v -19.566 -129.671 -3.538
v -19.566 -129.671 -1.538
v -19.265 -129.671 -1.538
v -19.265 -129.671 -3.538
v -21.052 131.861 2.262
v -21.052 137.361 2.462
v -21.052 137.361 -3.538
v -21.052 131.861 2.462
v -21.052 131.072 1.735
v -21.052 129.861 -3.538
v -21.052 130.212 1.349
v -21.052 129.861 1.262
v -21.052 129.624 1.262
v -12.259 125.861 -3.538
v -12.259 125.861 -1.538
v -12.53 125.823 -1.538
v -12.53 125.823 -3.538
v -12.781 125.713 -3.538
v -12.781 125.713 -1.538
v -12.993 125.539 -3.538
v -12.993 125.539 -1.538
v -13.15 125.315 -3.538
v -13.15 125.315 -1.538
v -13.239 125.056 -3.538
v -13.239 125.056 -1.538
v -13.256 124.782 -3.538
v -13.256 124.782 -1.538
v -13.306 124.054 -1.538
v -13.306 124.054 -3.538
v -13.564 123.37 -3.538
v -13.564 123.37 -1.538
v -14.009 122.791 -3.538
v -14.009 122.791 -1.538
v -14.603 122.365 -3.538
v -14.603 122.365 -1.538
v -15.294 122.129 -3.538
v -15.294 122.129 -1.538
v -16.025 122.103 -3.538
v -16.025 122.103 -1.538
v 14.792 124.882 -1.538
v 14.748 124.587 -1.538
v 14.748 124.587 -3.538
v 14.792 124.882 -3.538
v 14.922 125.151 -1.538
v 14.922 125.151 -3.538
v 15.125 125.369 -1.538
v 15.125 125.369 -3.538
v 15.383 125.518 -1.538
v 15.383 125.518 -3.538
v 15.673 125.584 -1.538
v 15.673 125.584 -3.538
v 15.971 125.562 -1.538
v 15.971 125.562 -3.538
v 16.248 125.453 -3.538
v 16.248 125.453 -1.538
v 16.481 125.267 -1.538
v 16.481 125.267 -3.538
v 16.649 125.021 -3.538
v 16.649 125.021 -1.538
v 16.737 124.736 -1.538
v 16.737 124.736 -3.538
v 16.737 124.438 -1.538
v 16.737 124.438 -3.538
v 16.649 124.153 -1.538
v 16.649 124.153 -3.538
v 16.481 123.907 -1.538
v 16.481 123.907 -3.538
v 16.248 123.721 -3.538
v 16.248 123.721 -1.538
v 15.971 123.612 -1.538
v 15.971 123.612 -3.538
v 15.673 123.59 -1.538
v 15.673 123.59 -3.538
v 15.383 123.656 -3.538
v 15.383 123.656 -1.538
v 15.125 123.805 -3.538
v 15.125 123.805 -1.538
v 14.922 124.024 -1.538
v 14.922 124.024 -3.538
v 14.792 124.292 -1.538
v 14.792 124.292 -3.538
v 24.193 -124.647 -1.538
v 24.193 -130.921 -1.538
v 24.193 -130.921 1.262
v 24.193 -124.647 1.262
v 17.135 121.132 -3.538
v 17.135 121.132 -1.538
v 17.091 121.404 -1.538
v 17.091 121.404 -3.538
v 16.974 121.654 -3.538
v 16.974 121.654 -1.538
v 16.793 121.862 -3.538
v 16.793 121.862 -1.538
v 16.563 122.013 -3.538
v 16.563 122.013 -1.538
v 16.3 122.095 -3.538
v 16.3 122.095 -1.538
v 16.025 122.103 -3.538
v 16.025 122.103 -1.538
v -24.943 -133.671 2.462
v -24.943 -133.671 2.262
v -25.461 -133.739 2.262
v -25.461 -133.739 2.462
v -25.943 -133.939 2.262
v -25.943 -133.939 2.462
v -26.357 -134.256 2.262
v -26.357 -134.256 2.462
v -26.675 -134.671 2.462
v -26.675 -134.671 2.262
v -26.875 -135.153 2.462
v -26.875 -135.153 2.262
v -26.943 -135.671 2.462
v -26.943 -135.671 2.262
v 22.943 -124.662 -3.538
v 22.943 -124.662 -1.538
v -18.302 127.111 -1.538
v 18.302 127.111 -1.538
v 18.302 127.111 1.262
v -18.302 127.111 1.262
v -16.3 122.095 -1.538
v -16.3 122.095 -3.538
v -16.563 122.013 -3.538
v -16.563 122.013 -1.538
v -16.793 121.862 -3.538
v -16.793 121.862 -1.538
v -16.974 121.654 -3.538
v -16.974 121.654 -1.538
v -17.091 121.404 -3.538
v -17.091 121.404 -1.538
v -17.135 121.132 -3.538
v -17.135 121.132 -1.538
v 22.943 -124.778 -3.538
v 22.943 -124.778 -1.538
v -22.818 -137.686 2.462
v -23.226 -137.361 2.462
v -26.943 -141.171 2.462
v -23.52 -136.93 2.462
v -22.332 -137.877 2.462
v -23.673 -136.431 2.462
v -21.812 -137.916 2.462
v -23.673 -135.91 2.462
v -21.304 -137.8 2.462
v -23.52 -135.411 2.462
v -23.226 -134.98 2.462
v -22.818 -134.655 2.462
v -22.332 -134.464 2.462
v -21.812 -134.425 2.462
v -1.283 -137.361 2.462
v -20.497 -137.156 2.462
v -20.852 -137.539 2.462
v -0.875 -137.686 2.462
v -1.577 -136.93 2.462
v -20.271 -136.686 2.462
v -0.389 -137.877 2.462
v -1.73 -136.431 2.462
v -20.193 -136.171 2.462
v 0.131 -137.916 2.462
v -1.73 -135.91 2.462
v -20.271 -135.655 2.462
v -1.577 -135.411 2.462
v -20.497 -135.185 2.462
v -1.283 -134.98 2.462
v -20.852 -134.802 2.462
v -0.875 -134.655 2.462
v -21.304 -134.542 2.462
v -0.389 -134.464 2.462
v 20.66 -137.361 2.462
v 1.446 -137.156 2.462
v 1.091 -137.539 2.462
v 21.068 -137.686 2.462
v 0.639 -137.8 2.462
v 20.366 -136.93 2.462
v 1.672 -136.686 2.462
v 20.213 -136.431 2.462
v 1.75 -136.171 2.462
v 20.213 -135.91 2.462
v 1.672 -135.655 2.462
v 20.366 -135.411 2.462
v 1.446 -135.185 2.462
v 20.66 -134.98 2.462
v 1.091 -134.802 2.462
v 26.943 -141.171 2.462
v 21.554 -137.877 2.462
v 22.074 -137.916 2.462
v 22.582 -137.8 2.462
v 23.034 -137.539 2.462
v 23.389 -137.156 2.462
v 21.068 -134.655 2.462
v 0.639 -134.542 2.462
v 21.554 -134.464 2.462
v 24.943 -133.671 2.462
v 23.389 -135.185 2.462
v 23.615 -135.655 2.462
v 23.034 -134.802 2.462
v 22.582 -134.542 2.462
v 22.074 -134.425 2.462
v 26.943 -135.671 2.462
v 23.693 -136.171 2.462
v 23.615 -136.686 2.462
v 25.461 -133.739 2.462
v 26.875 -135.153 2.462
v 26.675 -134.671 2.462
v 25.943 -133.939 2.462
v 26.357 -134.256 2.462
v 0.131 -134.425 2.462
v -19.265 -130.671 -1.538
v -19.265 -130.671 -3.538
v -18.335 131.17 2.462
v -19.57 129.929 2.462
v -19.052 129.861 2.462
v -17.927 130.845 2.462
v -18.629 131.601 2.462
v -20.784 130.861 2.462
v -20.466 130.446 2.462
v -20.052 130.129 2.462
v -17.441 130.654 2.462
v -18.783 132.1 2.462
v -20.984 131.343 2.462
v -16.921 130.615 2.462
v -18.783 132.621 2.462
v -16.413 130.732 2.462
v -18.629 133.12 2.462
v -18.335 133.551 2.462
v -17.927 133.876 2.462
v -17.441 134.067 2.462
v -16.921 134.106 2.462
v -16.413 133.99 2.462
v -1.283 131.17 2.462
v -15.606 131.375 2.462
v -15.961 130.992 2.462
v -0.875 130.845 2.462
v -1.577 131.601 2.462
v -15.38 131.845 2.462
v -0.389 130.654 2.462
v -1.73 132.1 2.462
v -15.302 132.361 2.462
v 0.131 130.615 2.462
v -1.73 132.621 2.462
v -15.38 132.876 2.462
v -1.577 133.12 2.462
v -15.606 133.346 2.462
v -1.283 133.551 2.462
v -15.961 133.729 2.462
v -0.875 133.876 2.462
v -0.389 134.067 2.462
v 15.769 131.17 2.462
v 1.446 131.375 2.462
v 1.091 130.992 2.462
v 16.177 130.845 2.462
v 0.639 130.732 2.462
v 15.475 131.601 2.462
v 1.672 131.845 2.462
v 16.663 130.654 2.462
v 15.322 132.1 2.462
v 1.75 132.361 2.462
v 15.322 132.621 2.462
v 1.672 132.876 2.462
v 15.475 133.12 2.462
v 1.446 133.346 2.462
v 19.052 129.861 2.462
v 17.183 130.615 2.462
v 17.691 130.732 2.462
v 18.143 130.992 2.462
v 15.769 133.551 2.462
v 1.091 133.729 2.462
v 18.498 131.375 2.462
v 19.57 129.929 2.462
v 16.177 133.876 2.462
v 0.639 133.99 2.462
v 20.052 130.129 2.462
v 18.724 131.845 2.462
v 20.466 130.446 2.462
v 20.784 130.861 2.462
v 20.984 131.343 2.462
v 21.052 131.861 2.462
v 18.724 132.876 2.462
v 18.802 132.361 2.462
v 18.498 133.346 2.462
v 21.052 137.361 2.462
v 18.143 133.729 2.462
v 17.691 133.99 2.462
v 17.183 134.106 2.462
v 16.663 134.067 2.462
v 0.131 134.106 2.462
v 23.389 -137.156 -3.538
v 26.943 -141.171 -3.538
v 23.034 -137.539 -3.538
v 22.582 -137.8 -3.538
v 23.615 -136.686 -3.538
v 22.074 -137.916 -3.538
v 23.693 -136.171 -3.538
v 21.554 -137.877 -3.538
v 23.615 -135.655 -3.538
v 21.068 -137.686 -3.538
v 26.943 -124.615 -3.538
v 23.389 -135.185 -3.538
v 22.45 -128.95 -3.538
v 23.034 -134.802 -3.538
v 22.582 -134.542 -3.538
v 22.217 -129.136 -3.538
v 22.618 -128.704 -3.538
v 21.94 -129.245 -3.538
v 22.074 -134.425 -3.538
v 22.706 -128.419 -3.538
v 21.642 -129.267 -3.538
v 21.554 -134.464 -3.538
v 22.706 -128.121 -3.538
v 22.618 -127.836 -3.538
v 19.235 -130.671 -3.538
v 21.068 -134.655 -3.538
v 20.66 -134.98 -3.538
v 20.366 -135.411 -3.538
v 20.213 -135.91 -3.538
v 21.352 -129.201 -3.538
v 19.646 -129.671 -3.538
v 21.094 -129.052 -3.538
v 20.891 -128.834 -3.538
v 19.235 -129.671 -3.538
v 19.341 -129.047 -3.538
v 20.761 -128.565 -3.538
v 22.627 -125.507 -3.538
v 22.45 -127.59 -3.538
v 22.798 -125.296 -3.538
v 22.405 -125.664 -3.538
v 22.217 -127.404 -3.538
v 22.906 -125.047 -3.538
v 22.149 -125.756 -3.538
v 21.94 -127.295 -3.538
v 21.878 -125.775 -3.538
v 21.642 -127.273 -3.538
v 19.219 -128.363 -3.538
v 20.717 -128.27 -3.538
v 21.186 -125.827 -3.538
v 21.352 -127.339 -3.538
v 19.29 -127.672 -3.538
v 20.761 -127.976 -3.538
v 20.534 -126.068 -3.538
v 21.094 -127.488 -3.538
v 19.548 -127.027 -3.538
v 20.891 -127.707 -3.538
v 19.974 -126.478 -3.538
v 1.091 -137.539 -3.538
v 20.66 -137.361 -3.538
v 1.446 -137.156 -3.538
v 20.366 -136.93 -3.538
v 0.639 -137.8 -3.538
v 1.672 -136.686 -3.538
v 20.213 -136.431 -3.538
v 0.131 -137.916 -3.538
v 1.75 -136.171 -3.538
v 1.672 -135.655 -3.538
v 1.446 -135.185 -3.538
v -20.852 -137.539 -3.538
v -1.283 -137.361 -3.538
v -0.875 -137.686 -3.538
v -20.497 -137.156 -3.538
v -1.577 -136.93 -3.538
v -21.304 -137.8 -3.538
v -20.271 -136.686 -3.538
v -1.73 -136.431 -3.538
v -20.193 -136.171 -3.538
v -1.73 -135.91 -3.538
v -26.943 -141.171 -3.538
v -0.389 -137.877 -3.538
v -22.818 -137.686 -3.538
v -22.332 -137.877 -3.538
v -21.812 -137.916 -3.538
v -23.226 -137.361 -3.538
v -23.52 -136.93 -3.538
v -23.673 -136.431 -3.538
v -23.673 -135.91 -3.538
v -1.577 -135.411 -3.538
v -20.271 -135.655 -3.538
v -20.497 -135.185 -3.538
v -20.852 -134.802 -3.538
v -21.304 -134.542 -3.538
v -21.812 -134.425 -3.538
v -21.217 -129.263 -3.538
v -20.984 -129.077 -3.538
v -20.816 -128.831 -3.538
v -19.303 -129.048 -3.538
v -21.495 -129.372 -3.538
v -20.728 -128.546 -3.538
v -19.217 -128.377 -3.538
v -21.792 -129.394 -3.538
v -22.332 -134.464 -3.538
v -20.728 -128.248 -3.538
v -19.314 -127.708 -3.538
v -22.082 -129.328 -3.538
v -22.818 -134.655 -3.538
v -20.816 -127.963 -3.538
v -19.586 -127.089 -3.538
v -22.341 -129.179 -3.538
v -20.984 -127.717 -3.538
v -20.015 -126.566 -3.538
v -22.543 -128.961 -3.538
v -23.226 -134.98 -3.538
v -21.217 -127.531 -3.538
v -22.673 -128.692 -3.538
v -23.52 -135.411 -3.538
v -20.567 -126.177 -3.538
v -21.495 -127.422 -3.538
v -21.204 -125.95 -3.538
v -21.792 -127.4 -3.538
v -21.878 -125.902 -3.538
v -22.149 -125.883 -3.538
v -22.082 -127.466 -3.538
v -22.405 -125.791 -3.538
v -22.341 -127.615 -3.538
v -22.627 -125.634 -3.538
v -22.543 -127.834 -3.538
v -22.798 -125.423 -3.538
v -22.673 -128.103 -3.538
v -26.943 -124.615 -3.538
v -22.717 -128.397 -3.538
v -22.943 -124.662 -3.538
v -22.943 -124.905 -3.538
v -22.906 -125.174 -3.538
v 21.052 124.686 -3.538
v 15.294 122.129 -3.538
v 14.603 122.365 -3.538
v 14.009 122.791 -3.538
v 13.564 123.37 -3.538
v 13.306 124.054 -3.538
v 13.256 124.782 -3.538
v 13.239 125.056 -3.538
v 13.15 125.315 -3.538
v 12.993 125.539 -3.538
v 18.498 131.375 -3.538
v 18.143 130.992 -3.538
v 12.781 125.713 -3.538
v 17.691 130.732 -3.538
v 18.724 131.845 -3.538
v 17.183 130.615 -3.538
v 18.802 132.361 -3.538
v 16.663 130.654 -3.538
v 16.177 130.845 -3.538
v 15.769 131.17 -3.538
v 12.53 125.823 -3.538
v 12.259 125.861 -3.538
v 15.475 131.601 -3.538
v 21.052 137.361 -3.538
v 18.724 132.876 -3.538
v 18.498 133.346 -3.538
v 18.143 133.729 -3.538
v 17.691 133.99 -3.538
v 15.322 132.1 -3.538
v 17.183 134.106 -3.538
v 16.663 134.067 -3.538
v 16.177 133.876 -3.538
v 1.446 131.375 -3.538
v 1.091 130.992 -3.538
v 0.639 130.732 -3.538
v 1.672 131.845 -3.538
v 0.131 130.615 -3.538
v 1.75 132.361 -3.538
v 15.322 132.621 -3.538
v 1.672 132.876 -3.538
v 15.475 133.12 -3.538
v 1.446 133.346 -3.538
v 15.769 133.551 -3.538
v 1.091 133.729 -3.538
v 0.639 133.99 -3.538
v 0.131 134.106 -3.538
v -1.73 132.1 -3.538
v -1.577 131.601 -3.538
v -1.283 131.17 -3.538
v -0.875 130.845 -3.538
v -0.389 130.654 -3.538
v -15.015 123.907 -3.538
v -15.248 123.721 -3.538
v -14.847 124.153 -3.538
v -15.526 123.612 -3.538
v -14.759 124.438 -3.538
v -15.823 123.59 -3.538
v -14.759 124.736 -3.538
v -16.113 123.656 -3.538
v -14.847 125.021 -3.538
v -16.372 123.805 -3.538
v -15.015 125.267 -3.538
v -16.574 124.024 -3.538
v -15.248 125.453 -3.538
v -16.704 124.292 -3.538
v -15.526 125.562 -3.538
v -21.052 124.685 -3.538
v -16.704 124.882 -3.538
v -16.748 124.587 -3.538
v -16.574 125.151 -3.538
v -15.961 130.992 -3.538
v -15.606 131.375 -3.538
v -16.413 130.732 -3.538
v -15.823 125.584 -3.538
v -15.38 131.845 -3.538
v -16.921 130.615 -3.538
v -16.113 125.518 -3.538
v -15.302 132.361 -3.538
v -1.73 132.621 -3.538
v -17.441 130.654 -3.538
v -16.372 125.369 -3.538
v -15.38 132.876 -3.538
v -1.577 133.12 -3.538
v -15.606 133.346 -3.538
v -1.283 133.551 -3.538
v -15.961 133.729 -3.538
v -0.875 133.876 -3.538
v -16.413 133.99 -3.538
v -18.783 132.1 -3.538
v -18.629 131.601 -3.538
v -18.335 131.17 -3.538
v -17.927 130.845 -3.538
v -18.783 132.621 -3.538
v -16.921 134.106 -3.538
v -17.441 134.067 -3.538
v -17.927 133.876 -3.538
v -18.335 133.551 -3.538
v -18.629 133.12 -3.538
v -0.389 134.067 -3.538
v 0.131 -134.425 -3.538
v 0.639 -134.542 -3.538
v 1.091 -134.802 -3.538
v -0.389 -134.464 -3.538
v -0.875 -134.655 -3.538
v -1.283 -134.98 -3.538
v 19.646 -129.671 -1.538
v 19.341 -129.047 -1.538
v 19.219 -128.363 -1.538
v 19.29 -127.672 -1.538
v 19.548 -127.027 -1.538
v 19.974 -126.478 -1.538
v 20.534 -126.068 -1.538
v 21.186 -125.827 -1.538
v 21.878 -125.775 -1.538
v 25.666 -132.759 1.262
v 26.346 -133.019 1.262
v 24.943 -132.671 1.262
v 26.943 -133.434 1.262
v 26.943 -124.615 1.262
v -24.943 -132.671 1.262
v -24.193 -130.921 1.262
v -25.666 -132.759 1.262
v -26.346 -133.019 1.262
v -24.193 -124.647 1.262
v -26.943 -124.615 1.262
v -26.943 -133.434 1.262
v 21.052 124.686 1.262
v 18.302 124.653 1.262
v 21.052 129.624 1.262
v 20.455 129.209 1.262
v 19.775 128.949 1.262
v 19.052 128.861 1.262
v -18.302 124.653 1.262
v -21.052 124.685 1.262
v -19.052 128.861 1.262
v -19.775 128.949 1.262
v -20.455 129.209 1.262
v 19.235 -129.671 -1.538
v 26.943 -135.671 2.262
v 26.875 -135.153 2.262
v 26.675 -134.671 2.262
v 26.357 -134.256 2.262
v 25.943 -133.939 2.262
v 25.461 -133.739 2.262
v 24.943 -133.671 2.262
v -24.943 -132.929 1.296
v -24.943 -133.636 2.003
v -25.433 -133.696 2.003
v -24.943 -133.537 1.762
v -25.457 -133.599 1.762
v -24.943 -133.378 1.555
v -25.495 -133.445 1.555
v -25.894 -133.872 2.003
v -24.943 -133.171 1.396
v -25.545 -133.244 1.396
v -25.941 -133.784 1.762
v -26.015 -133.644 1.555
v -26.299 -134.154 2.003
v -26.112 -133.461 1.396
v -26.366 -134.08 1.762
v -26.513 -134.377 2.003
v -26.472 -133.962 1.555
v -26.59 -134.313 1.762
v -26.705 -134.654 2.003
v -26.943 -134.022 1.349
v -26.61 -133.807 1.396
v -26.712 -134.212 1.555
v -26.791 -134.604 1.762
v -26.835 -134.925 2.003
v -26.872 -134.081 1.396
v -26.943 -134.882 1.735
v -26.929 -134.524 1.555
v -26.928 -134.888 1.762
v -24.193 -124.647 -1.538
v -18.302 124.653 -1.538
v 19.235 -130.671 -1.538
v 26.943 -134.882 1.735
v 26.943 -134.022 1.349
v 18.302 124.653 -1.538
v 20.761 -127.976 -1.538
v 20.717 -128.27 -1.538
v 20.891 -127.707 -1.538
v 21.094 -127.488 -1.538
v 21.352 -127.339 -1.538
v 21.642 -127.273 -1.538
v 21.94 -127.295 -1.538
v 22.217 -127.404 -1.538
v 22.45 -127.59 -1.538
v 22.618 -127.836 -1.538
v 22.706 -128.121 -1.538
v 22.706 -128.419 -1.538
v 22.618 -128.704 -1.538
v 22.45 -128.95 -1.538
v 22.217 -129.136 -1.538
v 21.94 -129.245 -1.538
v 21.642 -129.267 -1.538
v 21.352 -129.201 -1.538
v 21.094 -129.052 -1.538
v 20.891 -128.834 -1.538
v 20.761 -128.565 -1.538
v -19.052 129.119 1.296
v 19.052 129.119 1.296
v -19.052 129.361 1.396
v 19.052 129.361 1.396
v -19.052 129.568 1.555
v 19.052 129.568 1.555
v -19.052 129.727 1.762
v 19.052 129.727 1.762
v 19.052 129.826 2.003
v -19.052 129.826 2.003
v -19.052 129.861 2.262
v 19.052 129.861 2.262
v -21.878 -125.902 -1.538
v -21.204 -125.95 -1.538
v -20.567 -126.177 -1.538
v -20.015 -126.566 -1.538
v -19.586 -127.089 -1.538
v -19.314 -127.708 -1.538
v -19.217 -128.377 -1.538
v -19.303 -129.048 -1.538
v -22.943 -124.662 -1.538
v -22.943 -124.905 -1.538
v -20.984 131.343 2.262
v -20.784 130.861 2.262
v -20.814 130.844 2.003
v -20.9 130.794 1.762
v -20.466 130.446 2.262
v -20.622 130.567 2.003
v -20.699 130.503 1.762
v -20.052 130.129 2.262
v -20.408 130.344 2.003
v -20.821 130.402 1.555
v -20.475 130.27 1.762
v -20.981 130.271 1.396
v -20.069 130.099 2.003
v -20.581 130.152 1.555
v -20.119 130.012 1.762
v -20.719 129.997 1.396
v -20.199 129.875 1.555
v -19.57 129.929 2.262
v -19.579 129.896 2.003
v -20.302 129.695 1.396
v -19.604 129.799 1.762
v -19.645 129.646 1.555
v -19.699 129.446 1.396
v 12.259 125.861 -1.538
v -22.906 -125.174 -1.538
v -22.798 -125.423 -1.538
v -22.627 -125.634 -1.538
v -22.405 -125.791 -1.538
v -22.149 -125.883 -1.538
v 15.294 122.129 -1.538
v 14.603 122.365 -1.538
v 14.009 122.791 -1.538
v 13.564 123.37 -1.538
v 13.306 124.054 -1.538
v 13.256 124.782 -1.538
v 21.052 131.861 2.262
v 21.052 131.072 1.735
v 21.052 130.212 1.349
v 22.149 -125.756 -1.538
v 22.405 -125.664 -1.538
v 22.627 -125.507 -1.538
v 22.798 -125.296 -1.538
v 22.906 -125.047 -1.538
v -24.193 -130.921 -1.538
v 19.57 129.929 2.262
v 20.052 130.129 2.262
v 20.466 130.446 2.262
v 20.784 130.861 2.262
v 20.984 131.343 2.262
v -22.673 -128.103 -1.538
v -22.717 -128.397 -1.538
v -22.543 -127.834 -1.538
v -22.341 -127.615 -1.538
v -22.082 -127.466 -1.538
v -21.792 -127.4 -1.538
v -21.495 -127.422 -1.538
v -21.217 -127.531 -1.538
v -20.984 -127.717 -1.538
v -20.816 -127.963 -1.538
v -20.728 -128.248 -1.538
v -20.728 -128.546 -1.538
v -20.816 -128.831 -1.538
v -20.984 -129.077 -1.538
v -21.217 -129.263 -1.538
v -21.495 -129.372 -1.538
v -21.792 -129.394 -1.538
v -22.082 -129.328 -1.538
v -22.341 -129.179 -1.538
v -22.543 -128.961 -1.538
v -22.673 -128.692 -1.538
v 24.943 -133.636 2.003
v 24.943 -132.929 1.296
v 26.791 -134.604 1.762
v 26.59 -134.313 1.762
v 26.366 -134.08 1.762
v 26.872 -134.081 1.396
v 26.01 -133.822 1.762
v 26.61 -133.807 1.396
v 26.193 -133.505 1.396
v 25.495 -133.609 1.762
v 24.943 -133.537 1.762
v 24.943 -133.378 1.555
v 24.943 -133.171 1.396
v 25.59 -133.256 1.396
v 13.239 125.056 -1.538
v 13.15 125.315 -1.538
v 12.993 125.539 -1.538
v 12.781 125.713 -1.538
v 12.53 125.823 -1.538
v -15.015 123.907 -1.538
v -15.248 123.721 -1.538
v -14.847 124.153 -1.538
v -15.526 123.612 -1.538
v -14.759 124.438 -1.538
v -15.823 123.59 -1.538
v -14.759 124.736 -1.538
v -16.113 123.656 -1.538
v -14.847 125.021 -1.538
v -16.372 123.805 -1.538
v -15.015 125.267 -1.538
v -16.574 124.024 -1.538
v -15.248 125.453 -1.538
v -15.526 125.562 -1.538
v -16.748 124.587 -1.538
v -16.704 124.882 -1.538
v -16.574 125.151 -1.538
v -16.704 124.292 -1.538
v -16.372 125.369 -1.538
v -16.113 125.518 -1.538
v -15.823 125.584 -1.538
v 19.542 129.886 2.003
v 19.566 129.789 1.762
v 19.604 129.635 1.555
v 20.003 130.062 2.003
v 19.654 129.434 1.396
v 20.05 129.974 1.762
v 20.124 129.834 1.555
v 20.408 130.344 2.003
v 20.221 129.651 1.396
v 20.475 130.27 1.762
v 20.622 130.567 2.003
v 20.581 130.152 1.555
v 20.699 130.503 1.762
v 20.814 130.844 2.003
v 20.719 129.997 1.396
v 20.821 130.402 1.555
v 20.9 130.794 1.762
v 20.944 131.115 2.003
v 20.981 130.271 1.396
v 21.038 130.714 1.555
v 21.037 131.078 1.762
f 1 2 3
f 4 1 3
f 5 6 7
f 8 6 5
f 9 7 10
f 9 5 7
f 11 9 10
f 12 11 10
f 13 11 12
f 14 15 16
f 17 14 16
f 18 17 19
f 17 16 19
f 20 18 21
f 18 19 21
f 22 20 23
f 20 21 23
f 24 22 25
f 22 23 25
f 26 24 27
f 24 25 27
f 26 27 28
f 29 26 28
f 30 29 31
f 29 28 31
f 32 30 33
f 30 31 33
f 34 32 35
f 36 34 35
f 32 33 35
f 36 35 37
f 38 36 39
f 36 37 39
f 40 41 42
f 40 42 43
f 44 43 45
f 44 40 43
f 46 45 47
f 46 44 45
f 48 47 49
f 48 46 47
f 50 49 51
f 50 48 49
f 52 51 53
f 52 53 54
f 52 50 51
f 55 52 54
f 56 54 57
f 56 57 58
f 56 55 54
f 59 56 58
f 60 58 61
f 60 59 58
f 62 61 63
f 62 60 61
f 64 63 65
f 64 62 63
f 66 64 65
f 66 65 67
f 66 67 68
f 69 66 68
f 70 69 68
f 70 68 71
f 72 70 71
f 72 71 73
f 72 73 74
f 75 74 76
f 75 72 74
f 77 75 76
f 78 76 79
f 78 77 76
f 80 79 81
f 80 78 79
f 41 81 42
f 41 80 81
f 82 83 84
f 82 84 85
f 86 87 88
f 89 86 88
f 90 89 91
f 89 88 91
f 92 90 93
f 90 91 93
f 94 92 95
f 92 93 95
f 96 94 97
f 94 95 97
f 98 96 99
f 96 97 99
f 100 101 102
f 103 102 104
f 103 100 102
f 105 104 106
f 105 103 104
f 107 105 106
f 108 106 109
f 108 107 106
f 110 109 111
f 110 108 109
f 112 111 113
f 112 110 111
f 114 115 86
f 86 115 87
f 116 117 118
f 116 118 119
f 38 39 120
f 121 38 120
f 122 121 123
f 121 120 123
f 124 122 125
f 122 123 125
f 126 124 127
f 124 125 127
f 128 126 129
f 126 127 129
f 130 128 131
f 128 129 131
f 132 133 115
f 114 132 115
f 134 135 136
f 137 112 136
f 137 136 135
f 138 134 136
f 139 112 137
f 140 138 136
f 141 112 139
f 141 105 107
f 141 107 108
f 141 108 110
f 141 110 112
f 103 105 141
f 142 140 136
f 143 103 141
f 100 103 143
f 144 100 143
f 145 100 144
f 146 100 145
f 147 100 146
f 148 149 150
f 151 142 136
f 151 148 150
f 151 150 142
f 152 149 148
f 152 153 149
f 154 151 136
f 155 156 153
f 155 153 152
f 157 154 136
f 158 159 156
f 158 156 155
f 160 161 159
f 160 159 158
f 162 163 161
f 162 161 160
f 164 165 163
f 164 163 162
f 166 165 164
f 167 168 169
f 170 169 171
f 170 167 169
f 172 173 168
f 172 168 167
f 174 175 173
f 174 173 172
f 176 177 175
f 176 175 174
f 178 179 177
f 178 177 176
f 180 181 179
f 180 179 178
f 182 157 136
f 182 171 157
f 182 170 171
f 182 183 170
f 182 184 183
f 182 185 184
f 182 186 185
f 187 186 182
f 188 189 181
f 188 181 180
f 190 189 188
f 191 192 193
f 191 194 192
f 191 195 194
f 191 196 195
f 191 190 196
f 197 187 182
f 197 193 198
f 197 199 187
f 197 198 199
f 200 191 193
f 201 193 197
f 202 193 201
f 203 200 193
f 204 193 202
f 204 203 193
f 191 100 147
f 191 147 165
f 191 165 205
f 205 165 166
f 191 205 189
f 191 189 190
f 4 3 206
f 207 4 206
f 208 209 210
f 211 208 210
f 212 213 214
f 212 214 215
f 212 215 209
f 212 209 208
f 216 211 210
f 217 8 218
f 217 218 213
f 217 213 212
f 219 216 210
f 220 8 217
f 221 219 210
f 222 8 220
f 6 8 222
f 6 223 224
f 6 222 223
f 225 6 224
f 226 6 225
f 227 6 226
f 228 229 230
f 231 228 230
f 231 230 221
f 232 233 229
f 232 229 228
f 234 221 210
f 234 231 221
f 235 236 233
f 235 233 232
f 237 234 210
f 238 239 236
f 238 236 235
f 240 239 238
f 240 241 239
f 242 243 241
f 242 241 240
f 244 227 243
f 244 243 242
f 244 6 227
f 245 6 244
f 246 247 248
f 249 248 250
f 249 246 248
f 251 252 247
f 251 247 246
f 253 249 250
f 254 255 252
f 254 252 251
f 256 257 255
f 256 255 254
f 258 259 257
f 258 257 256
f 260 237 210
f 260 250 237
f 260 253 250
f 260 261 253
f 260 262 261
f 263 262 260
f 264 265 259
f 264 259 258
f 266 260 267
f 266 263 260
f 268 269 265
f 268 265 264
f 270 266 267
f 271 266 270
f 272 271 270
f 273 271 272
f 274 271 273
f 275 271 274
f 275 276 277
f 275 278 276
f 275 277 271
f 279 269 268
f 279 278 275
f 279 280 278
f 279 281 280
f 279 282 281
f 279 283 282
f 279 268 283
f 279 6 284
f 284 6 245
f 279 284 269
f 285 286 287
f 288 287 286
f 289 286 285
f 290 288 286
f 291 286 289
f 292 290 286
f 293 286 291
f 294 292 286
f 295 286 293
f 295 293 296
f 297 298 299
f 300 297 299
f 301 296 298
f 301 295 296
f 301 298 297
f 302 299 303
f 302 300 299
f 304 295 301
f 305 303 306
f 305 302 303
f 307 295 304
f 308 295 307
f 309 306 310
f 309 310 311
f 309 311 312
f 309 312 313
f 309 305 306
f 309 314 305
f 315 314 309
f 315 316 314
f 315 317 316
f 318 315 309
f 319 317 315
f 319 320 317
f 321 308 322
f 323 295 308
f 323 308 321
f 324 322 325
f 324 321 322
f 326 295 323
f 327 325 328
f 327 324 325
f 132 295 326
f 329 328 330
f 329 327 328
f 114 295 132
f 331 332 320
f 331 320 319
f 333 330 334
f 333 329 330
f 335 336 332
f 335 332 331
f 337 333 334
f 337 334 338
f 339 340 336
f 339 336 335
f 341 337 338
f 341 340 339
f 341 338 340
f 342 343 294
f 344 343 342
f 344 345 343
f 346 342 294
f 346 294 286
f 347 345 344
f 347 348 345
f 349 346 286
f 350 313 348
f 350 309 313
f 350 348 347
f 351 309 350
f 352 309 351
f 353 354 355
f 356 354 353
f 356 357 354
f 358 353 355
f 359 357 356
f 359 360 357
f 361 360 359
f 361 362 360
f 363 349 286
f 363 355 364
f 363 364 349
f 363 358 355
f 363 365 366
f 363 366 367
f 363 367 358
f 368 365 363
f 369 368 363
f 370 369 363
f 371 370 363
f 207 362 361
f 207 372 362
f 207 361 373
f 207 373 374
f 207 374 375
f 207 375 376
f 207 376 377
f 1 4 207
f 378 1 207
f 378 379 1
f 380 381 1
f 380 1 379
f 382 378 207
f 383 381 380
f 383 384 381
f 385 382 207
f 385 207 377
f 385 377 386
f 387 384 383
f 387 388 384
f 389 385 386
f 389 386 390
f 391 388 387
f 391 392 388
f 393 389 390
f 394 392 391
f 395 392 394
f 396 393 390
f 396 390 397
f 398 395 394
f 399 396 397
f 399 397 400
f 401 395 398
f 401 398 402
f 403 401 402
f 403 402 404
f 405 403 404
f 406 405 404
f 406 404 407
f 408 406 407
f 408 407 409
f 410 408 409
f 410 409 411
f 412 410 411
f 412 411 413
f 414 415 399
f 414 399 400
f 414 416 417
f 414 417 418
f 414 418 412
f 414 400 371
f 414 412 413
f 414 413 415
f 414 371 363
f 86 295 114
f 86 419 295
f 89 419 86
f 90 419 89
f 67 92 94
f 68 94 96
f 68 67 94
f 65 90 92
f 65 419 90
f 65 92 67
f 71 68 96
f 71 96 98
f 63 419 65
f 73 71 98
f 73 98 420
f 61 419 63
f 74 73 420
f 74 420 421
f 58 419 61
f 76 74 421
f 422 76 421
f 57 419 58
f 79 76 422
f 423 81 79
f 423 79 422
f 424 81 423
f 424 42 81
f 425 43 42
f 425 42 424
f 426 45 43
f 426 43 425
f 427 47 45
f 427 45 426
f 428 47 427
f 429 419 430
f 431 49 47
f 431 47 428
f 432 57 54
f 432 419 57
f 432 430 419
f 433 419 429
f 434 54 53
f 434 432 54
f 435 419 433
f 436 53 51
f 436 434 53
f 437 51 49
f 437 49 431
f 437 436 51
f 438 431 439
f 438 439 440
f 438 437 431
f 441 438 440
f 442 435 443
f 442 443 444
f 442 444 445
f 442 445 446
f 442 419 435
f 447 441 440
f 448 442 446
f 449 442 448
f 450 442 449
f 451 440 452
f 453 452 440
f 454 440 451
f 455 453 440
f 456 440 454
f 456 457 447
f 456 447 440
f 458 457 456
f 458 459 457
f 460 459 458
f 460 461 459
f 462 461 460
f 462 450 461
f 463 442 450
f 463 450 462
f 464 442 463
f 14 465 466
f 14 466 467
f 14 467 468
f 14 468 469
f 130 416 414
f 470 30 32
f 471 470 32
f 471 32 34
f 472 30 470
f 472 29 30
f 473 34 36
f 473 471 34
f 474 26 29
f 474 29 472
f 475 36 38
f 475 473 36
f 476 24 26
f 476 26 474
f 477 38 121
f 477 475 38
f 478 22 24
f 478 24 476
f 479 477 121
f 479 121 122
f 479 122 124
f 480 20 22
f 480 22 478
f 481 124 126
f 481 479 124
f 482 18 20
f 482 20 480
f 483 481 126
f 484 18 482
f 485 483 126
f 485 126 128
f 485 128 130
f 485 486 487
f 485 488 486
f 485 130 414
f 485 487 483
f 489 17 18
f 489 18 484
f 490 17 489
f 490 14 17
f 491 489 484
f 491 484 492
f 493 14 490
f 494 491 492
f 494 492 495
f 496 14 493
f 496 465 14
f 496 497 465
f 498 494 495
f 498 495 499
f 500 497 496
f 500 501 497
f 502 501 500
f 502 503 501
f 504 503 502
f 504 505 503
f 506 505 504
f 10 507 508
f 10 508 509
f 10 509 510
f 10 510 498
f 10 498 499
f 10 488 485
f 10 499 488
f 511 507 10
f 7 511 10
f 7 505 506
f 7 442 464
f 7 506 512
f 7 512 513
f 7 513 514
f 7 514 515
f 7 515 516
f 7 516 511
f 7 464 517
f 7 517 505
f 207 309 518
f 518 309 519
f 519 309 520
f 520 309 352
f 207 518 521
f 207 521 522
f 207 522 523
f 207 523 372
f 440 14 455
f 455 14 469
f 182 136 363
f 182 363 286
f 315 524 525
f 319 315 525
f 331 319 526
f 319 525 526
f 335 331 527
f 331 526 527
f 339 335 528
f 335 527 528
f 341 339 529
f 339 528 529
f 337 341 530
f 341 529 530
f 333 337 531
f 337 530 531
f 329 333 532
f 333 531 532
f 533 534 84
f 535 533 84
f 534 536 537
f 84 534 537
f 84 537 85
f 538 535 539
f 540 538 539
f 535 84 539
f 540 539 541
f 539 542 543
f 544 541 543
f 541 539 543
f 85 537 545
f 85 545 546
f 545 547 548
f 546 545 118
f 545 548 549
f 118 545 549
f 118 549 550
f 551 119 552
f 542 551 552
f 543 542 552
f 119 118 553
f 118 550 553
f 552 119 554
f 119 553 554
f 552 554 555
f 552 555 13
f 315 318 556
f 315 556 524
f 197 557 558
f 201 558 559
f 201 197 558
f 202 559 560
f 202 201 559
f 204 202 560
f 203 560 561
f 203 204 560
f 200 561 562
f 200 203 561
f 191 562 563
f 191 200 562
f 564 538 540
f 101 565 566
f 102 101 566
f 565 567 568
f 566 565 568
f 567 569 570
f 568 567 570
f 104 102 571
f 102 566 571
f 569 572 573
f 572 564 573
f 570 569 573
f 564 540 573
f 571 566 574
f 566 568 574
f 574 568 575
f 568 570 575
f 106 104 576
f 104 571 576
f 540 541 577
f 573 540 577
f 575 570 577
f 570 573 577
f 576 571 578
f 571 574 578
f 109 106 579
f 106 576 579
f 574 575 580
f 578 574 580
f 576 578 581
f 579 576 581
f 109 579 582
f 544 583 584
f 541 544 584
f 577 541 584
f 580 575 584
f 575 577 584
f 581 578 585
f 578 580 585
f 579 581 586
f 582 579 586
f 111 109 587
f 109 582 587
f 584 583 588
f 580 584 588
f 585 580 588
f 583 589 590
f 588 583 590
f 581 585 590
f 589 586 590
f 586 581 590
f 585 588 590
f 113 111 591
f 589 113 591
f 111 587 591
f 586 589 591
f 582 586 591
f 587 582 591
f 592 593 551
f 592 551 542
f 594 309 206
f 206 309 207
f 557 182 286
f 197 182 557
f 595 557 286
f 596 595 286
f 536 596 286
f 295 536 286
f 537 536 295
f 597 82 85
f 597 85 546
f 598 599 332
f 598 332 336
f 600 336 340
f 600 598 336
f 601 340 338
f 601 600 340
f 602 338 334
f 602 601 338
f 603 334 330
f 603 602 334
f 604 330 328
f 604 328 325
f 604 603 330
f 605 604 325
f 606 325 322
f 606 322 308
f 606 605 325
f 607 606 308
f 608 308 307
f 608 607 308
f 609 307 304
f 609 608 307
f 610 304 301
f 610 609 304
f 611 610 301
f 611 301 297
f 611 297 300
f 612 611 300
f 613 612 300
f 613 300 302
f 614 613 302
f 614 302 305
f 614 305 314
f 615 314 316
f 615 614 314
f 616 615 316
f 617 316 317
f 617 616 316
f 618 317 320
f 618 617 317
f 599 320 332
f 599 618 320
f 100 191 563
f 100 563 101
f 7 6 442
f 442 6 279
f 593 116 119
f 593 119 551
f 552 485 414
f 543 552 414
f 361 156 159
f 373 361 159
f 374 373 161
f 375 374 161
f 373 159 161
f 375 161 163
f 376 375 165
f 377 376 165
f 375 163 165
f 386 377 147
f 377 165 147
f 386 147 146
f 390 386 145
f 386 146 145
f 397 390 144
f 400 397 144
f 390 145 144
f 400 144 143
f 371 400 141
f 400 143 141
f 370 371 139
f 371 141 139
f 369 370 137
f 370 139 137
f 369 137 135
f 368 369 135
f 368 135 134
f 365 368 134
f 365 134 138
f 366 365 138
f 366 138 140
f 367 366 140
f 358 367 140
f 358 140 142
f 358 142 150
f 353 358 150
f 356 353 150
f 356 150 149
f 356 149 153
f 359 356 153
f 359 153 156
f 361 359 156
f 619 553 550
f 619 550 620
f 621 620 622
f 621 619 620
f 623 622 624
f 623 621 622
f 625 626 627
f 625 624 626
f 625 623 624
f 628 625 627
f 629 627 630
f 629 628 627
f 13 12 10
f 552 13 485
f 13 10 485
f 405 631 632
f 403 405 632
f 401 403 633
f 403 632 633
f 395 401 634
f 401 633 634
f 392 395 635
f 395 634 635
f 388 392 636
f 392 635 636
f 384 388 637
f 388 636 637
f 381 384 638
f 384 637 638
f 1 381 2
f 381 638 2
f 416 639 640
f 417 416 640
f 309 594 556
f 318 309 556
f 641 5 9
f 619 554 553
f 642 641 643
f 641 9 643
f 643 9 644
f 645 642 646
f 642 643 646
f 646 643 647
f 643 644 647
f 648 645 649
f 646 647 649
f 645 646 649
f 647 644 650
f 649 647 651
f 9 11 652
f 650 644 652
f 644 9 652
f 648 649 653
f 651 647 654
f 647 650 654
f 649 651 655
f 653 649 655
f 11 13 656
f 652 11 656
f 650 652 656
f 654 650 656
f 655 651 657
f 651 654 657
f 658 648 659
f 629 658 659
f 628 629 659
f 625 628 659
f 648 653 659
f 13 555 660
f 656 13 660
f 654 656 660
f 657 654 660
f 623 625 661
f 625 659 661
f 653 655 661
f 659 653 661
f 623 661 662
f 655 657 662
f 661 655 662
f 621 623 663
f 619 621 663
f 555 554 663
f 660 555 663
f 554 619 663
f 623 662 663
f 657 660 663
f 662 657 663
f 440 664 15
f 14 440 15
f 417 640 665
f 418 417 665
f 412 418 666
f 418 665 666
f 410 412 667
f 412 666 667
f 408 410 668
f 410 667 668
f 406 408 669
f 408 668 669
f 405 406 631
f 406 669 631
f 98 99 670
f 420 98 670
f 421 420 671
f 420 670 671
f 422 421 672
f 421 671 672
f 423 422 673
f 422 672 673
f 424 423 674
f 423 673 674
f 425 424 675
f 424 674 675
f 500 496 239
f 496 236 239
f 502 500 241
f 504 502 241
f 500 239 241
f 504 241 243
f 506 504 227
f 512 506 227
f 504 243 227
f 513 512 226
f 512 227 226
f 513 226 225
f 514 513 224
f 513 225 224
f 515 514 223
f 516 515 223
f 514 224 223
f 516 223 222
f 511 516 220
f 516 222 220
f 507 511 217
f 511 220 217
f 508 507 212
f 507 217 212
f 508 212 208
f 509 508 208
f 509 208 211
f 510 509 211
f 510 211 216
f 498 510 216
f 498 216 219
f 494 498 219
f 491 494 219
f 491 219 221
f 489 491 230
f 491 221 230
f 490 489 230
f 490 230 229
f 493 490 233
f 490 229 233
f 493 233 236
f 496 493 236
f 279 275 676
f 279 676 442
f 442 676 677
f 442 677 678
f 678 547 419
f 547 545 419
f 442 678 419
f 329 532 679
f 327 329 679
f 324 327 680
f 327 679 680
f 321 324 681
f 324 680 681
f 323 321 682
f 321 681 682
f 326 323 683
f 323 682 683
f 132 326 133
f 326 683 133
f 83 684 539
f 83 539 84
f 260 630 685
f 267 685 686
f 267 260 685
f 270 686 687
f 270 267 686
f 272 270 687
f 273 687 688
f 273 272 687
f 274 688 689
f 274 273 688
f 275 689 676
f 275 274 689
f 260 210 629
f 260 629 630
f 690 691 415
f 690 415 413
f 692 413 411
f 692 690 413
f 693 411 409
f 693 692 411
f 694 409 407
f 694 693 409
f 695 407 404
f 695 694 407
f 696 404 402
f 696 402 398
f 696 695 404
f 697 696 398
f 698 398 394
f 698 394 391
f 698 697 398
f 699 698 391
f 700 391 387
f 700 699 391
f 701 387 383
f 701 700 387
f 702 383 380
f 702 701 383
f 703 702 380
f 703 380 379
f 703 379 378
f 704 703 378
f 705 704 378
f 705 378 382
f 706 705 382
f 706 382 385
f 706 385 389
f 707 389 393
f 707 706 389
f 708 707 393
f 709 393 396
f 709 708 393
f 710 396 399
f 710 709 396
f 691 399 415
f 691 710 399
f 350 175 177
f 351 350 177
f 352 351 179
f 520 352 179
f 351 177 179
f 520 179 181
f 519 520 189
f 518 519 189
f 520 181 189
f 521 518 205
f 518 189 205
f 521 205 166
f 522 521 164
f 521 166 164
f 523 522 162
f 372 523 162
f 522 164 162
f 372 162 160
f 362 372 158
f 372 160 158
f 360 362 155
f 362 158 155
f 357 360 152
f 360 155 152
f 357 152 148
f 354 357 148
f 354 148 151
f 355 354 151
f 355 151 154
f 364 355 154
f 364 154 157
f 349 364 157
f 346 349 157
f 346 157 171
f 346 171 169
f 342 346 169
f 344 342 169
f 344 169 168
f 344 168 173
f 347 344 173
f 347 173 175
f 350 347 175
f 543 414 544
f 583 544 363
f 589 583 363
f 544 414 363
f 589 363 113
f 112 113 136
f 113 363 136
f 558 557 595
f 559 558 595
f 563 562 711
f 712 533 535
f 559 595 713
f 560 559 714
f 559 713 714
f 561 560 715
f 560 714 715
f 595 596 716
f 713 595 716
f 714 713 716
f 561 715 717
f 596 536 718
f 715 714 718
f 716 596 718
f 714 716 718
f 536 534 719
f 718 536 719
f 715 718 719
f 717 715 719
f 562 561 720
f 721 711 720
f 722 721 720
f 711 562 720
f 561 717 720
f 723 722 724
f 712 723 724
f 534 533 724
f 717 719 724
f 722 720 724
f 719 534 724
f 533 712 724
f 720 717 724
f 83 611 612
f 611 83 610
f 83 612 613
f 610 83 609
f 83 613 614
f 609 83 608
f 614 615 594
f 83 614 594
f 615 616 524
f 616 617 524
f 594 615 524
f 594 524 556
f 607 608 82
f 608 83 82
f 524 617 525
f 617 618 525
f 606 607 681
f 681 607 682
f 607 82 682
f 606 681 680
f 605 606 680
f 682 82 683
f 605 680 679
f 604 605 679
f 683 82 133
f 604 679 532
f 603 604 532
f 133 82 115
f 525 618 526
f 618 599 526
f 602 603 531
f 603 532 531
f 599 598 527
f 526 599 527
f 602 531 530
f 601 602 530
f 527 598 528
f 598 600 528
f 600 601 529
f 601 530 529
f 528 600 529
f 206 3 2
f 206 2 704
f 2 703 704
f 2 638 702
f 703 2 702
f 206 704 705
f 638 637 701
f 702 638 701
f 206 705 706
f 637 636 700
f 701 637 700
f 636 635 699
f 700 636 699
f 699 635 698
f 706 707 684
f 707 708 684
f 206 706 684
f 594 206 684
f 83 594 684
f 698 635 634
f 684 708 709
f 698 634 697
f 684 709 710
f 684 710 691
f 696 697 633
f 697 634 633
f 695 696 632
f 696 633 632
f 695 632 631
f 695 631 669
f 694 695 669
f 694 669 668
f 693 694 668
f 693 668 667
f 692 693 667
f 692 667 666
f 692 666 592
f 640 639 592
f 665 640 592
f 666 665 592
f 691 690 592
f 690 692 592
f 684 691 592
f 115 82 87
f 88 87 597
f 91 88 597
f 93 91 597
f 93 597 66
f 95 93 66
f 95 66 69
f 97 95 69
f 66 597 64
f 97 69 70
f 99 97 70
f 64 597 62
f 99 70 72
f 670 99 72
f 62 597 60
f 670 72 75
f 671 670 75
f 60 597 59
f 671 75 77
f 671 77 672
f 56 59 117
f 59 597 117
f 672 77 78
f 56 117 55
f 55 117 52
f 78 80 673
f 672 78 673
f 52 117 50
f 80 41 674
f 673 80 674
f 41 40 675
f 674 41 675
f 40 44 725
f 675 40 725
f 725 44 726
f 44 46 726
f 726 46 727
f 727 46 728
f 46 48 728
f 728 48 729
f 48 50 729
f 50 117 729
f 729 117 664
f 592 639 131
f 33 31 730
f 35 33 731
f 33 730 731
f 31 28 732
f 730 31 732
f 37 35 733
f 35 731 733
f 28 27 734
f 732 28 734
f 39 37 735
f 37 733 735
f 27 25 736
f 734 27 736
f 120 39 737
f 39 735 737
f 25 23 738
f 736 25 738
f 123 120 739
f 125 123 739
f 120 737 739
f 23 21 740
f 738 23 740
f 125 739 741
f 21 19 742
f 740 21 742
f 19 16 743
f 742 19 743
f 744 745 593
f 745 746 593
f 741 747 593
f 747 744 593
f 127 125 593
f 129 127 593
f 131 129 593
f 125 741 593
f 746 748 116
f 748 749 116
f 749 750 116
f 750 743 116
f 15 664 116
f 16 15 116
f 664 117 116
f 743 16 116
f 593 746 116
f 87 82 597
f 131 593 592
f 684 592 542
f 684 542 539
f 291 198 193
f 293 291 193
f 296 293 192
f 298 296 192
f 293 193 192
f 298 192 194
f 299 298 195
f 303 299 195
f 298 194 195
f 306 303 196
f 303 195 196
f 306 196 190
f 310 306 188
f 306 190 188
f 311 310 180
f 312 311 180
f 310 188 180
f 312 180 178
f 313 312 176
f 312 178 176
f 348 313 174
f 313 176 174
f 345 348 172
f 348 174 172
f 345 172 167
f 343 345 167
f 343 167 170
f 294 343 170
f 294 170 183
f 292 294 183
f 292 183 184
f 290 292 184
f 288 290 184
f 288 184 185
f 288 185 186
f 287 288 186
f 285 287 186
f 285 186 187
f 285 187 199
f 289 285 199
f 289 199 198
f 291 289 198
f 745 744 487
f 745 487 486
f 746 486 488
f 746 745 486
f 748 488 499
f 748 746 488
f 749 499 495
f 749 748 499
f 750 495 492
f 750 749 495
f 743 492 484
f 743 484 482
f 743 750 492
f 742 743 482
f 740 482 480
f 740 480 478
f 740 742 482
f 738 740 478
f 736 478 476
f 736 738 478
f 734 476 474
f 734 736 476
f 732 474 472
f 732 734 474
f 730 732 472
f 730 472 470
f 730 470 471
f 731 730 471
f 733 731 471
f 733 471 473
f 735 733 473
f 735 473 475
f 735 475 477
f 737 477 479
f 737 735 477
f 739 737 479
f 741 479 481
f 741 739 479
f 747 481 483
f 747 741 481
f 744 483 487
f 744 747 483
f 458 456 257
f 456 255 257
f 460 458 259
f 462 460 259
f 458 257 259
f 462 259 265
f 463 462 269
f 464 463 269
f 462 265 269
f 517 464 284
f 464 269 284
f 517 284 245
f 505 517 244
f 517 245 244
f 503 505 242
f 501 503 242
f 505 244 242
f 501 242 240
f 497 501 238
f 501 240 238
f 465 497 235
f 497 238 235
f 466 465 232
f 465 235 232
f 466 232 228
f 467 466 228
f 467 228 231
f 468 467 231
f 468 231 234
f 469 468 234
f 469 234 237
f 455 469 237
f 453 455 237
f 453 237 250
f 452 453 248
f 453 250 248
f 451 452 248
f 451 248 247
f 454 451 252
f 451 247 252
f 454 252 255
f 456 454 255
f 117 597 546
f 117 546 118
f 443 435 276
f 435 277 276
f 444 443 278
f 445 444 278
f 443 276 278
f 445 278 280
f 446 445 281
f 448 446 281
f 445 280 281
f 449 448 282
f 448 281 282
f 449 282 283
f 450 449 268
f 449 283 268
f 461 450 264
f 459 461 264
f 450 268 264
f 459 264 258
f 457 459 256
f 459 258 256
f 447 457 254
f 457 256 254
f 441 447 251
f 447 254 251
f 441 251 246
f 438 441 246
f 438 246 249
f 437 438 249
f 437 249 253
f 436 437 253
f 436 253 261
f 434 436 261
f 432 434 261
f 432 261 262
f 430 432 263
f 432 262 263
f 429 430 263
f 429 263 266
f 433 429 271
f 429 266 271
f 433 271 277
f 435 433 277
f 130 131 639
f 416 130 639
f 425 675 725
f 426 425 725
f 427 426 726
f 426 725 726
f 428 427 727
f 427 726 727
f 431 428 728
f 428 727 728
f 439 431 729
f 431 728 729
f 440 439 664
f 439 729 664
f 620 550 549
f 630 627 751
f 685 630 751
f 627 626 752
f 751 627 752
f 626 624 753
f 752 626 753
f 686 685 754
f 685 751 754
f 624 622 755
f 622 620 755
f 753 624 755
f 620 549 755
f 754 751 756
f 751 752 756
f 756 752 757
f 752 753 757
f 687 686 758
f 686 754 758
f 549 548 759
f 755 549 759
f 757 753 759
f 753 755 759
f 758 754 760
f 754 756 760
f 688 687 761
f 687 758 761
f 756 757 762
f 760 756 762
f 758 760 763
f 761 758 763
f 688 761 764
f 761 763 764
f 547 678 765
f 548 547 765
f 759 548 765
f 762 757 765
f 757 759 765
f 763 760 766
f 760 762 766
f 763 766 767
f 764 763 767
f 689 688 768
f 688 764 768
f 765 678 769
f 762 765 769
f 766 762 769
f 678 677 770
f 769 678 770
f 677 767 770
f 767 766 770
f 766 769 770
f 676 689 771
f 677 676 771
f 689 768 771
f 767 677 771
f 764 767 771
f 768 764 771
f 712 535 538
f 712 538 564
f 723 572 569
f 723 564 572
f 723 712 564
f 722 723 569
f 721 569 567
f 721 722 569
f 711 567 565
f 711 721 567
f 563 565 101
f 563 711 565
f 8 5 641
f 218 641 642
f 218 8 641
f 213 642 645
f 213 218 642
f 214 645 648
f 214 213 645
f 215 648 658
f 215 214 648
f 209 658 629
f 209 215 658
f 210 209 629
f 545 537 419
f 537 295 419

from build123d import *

# Parameters (mm, degrees)
SKETCH_2_R      = 1
EXTRUDE_1_DEPTH = 2
EXTRUDE_2_DEPTH = 2
EXTRUDE_3_DEPTH = 2.8
SKETCH_5_R      = 1.75
EXTRUDE_4_DEPTH = 4.8
EXTRUDE_START   = 1.2
SKETCH_6_R      = 1.75
EXTRUDE_5_DEPTH = 1.2
FILLET_1_R      = 1


with BuildPart() as part:
    # 草图2 → 凸台-拉伸1 (new body)
    with BuildSketch(Plane(origin=(0, 0, -1.538354077), x_dir=(-1, 0, 0), z_dir=(0, 0, -1))):
        with BuildLine():
            Line((-22.942959106, -124.662212149), (-17.134907671, 121.132350923))
            ThreePointArc((-17.134907671, 121.132350923), (-16.793190136, 121.861742775), (-16.024570953, 122.102591063))
            ThreePointArc((-16.024570953, 122.102591063), (-14.009380987, 122.790837638), (-13.255665128, 124.782466708))
            ThreePointArc((-13.255665128, 124.782466708), (-12.992914403, 125.539491489), (-12.25871858, 125.860553721))
            Line((-12.25871858, 125.860553721), (12.25871858, 125.860553721))
            ThreePointArc((12.25871858, 125.860553721), (12.992914403, 125.539491489), (13.255665128, 124.782466708))
            ThreePointArc((13.255665128, 124.782466708), (14.009380087, 122.79083851), (16.024568463, 122.102590786))
            ThreePointArc((16.024568463, 122.102590786), (16.793187022, 121.861742062), (17.134904184, 121.13235055))
            Line((17.134904184, 121.13235055), (22.942959106, -124.662212156))
            Line((22.942959106, -124.662212156), (22.942959106, -124.904555532))
            ThreePointArc((22.942959106, -124.904555532), (22.626864313, -125.634126411), (21.878411771, -125.902470178))
            ThreePointArc((21.878411771, -125.902470178), (19.586380534, -127.089481736), (19.565603095, -129.670561341))
            Line((19.565603095, -129.670561341), (19.265011022, -129.670561341))
            Line((19.265011022, -129.670561341), (19.265011022, -130.670561341))
            Line((19.265011022, -130.670561341), (23.942959106, -130.670561341))
            Line((23.942959106, -130.670561341), (23.942959106, -124.650398948))
            Line((23.942959106, -124.650398948), (18.052063488, 124.649948906))
            Line((18.052063488, 124.649948906), (18.052059944, 126.860553721))
            Line((18.052059944, 126.860553721), (-18.052059944, 126.860553721))
            Line((-18.052059944, 126.860553721), (-18.052059944, 124.65024892))
            Line((-18.052059944, 124.65024892), (-23.942959106, -124.650398948))
            Line((-23.942959106, -124.650398948), (-23.942959106, -130.670561341))
            Line((-23.942959106, -130.670561341), (-19.234988978, -130.670561341))
            Line((-19.234988978, -130.670561341), (-19.234988978, -129.670561341))
            Line((-19.234988978, -129.670561341), (-19.646017972, -129.670561341))
            ThreePointArc((-19.646017972, -129.670561341), (-19.548027097, -127.027128176), (-21.878411771, -125.775469924))
            ThreePointArc((-21.878411771, -125.775469924), (-22.626864313, -125.507126157), (-22.942959106, -124.777555278))
            Line((-22.942959106, -124.777555278), (-22.942959106, -124.662212149))
        make_face()
        with Locations((-21.717043434, -128.270256541)):
            Circle(SKETCH_2_R, mode=Mode.SUBTRACT)
        with Locations((21.717043434, -128.397256794)):
            Circle(SKETCH_2_R, mode=Mode.SUBTRACT)
        with Locations((-15.748031496, 124.587249174)):
            Circle(SKETCH_2_R, mode=Mode.SUBTRACT)
        with Locations((15.748031496, 124.587249174)):
            Circle(SKETCH_2_R, mode=Mode.SUBTRACT)
    extrude(amount=EXTRUDE_1_DEPTH)

    # 草图3 → 凸台-拉伸2 (add)
    with BuildSketch(Plane(origin=(0, 0, -3.538354077), x_dir=(-1, 0, 0), z_dir=(0, 0, -1))):
        Polygon((26.942959106, -124.614959326), (21.052063431, 124.685390934), (21.052055134, 129.860553721), (-21.052059944, 129.860553721), (-21.052059944, 124.685688522), (-26.942959106, -124.614959347), (-26.942959106, -133.670561341), (26.942959106, -133.670561341), align=None)
        Polygon((18.052059944, 126.860553721), (-18.052059944, 126.860553721), (-18.052059944, 124.65024892), (-23.942959106, -124.650398948), (-23.942959106, -130.670561341), (23.942959106, -130.670561341), (23.942959106, -124.650398948), (18.052063488, 124.649948906), align=None, mode=Mode.SUBTRACT)
    extrude(amount=-EXTRUDE_2_DEPTH)

    # 草图4 → 凸台-拉伸3 (add)
    with BuildSketch(Plane.XY.offset(-1.538354077)):
        Polygon((-21.052063431, 124.685390934), (-26.942959106, -124.614959326), (-26.942959106, -133.670561341), (26.942959106, -133.670561341), (26.942959106, -124.614959347), (21.052059944, 124.685688522), (21.052059944, 129.860553721), (-21.052055134, 129.860553721), align=None)
        Polygon((-18.302059543, 127.110553721), (-18.302063484, 124.652902409), (-24.192959106, -124.647445647), (-24.192959106, -130.920561341), (24.192959106, -130.920561341), (24.192959106, -124.647445648), (18.302059944, 124.653202221), (18.302059944, 127.110553721), align=None, mode=Mode.SUBTRACT)
    extrude(amount=EXTRUDE_3_DEPTH)

    # 草图5 → 凸台-拉伸4 (add)
    # profile 1 of 2: a face of its own
    with BuildSketch(Plane.XY.offset(1.261645923)):
        Polygon((-26.942959106, -133.670561341), (26.942959106, -133.670561341), (26.942959106, -138.670561341), (26.942959106, -141.170561341), (-26.942959106, -141.170561341), (-26.942959106, -138.670561341), align=None)
        with Locations((2.405e-06, -136.170561341)):
            Circle(SKETCH_5_R, mode=Mode.SUBTRACT)
        with Locations((21.942959106, -136.170561341)):
            Circle(SKETCH_5_R, mode=Mode.SUBTRACT)
        with Locations((-21.942959106, -136.170561341)):
            Circle(SKETCH_5_R, mode=Mode.SUBTRACT)
    # profile 2 of 2: a face of its own
    with BuildSketch(Plane.XY.offset(1.261645923)):
        Polygon((21.052059944, 129.860553721), (-21.052055134, 129.860553721), (-21.052055134, 134.860553721), (-21.052055134, 137.360553721), (21.052059944, 137.360553721), (21.052059944, 134.860553721), align=None)
        with Locations((-17.052055134, 132.360553721)):
            Circle(SKETCH_5_R, mode=Mode.SUBTRACT)
        with Locations((17.052059944, 132.360553721)):
            Circle(SKETCH_5_R, mode=Mode.SUBTRACT)
        with Locations((2.405e-06, 132.360553721)):
            Circle(SKETCH_5_R, mode=Mode.SUBTRACT)
    extrude(amount=-EXTRUDE_4_DEPTH)

    # 草图6 → 凸台-拉伸5 (add)
    # profile 1 of 2: a face of its own
    with BuildSketch(Plane.XY.offset(1.261645923).offset(EXTRUDE_START)):
        with BuildLine():
            Line((-26.942959106, -138.670561341), (-26.942959106, -141.170561341))
            Line((-26.942959106, -141.170561341), (26.942959106, -141.170561341))
            Line((26.942959106, -141.170561341), (26.942959106, -138.670561341))
            Line((26.942959106, -138.670561341), (26.942959106, -135.670561341))
            ThreePointArc((26.942959106, -135.670561341), (26.357172668, -134.256347779), (24.942959106, -133.670561341))
            Line((24.942959106, -133.670561341), (-24.942959106, -133.670561341))
            ThreePointArc((-24.942959106, -133.670561341), (-26.357172668, -134.256347779), (-26.942959106, -135.670561341))
            Line((-26.942959106, -135.670561341), (-26.942959106, -138.670561341))
        make_face()
        with Locations((21.942959106, -136.170561341)):
            Circle(SKETCH_6_R, mode=Mode.SUBTRACT)
        with Locations((2.405e-06, -136.170561341)):
            Circle(SKETCH_6_R, mode=Mode.SUBTRACT)
        with Locations((-21.942959106, -136.170561341)):
            Circle(SKETCH_6_R, mode=Mode.SUBTRACT)
    # profile 2 of 2: a face of its own
    with BuildSketch(Plane.XY.offset(1.261645923).offset(EXTRUDE_START)):
        with BuildLine():
            Line((21.052059944, 131.860553721), (21.052059944, 134.860553721))
            Line((21.052059944, 134.860553721), (21.052059944, 137.360553721))
            Line((21.052059944, 137.360553721), (-21.052055134, 137.360553721))
            Line((-21.052055134, 137.360553721), (-21.052055134, 134.860553721))
            Line((-21.052055134, 134.860553721), (-21.052055134, 131.860553721))
            ThreePointArc((-21.052055134, 131.860553721), (-20.466268697, 130.446340159), (-19.052055134, 129.860553721))
            Line((-19.052055134, 129.860553721), (19.052059944, 129.860553721))
            ThreePointArc((19.052059944, 129.860553721), (20.466273506, 130.446340159), (21.052059944, 131.860553721))
        make_face()
        with Locations((17.052059944, 132.360553721)):
            Circle(SKETCH_6_R, mode=Mode.SUBTRACT)
        with Locations((2.405e-06, 132.360553721)):
            Circle(SKETCH_6_R, mode=Mode.SUBTRACT)
        with Locations((-17.052055134, 132.360553721)):
            Circle(SKETCH_6_R, mode=Mode.SUBTRACT)
    extrude(amount=-EXTRUDE_5_DEPTH)

    # 圆角1
    # the kernel refuses this fillet: 1 mm, written as the material it adds along each edge
    with BuildSketch(Plane(origin=(24.942959106, -135.670561341, 1.261645923), x_dir=(0.31484580408697693, -0.9491428341660831, 0), z_dir=(-0.9491428341660831, -0.31484580408697693, 0))) as fillet_1_piece_1_section:
        with BuildLine():
            CenterArc((2 + FILLET_1_R, FILLET_1_R), FILLET_1_R, 180, 90)
            Line((2, FILLET_1_R), (2, 0))
            Line((2, 0), (2 + FILLET_1_R, 0))
        make_face()
    fillet_1_piece_1 = revolve(axis=Axis((24.942959106, -135.670561341, 1.261645923), (0, 0, 1)), revolution_arc=161.648494619, mode=Mode.PRIVATE)
    fillet_1_piece_1 = split(fillet_1_piece_1, bisect_by=Plane(origin=(26.942959106, -134.20836544, 1.533797611), z_dir=(-1, 0, 0)), keep=Keep.TOP, mode=Mode.PRIVATE)
    add(fillet_1_piece_1)
    with BuildSketch(Plane(origin=(-24.942959106, -135.670561341, 1.261645923), x_dir=(0, 1, 0), z_dir=(1, 0, 0))) as fillet_1_piece_2_section:
        with BuildLine():
            CenterArc((2 + FILLET_1_R, FILLET_1_R), FILLET_1_R, 180, 90)
            Line((2 + FILLET_1_R, 0), (2, 0))
            Line((2, 0), (2, FILLET_1_R))
        make_face()
    fillet_1_piece_2 = revolve(axis=Axis((-24.942959106, -135.670561341, 1.261645923), (0, 0, 1)), revolution_arc=161.648494619, mode=Mode.PRIVATE)
    fillet_1_piece_2 = split(fillet_1_piece_2, bisect_by=Plane(origin=(-26.942959106, -134.20836489, 1.533796612), z_dir=(1, 0, 0)), keep=Keep.TOP, mode=Mode.PRIVATE)
    add(fillet_1_piece_2)
    with BuildSketch(Plane(origin=(-19.052055134, 131.860553721, 1.261645923), x_dir=(-0.31484580408698715, 0.9491428341660799, 0), z_dir=(0.9491428341660799, 0.31484580408698715, 0))) as fillet_1_piece_3_section:
        with BuildLine():
            CenterArc((2 + FILLET_1_R, FILLET_1_R), FILLET_1_R, 180, 90)
            Line((2, FILLET_1_R), (2, 0))
            Line((2, 0), (2 + FILLET_1_R, 0))
        make_face()
    fillet_1_piece_3 = revolve(axis=Axis((-19.052055134, 131.860553721, 1.261645923), (0, 0, 1)), revolution_arc=161.648494619, mode=Mode.PRIVATE)
    fillet_1_piece_3 = split(fillet_1_piece_3, bisect_by=Plane(origin=(-21.052055134, 130.742519817, 1.42831269), z_dir=(1, 0, 0)), keep=Keep.TOP, mode=Mode.PRIVATE)
    add(fillet_1_piece_3)
    with BuildSketch(Plane(origin=(19.052059944, 131.860553721, 1.261645923), x_dir=(0, -1, 0), z_dir=(-1, 0, 0))) as fillet_1_piece_4_section:
        with BuildLine():
            CenterArc((2 + FILLET_1_R, FILLET_1_R), FILLET_1_R, 180, 90)
            Line((2, FILLET_1_R), (2, 0))
            Line((2, 0), (2 + FILLET_1_R, 0))
        make_face()
    fillet_1_piece_4 = revolve(axis=Axis((19.052059944, 131.860553721, 1.261645923), (0, 0, 1)), revolution_arc=161.648494619, mode=Mode.PRIVATE)
    fillet_1_piece_4 = split(fillet_1_piece_4, bisect_by=Plane(origin=(21.052059944, 129.648450881, 1.424284575), z_dir=(-1, 0, 0)), keep=Keep.TOP, mode=Mode.PRIVATE)
    add(fillet_1_piece_4)
    with BuildSketch(Plane(origin=(24.942959106, -133.670561341, 1.261645923), x_dir=(0, 1, 0), z_dir=(-1, 0, 0))) as fillet_1_piece_5:
        with BuildLine():
            CenterArc((FILLET_1_R, -FILLET_1_R), FILLET_1_R, 90, 90)
            Line((0, -FILLET_1_R), (0, 0))
            Line((0, 0), (FILLET_1_R, 0))
        make_face()
    extrude(amount=49.885918212)
    with BuildSketch(Plane(origin=(-19.052055134, 129.860553721, 1.261645923), x_dir=(0, -1, 0), z_dir=(1, 0, 0))) as fillet_1_piece_6:
        with BuildLine():
            CenterArc((FILLET_1_R, -FILLET_1_R), FILLET_1_R, 90, 90)
            Line((0, -FILLET_1_R), (0, 0))
            Line((0, 0), (FILLET_1_R, 0))
        make_face()
    extrude(amount=38.104115079)


solid = part.part
